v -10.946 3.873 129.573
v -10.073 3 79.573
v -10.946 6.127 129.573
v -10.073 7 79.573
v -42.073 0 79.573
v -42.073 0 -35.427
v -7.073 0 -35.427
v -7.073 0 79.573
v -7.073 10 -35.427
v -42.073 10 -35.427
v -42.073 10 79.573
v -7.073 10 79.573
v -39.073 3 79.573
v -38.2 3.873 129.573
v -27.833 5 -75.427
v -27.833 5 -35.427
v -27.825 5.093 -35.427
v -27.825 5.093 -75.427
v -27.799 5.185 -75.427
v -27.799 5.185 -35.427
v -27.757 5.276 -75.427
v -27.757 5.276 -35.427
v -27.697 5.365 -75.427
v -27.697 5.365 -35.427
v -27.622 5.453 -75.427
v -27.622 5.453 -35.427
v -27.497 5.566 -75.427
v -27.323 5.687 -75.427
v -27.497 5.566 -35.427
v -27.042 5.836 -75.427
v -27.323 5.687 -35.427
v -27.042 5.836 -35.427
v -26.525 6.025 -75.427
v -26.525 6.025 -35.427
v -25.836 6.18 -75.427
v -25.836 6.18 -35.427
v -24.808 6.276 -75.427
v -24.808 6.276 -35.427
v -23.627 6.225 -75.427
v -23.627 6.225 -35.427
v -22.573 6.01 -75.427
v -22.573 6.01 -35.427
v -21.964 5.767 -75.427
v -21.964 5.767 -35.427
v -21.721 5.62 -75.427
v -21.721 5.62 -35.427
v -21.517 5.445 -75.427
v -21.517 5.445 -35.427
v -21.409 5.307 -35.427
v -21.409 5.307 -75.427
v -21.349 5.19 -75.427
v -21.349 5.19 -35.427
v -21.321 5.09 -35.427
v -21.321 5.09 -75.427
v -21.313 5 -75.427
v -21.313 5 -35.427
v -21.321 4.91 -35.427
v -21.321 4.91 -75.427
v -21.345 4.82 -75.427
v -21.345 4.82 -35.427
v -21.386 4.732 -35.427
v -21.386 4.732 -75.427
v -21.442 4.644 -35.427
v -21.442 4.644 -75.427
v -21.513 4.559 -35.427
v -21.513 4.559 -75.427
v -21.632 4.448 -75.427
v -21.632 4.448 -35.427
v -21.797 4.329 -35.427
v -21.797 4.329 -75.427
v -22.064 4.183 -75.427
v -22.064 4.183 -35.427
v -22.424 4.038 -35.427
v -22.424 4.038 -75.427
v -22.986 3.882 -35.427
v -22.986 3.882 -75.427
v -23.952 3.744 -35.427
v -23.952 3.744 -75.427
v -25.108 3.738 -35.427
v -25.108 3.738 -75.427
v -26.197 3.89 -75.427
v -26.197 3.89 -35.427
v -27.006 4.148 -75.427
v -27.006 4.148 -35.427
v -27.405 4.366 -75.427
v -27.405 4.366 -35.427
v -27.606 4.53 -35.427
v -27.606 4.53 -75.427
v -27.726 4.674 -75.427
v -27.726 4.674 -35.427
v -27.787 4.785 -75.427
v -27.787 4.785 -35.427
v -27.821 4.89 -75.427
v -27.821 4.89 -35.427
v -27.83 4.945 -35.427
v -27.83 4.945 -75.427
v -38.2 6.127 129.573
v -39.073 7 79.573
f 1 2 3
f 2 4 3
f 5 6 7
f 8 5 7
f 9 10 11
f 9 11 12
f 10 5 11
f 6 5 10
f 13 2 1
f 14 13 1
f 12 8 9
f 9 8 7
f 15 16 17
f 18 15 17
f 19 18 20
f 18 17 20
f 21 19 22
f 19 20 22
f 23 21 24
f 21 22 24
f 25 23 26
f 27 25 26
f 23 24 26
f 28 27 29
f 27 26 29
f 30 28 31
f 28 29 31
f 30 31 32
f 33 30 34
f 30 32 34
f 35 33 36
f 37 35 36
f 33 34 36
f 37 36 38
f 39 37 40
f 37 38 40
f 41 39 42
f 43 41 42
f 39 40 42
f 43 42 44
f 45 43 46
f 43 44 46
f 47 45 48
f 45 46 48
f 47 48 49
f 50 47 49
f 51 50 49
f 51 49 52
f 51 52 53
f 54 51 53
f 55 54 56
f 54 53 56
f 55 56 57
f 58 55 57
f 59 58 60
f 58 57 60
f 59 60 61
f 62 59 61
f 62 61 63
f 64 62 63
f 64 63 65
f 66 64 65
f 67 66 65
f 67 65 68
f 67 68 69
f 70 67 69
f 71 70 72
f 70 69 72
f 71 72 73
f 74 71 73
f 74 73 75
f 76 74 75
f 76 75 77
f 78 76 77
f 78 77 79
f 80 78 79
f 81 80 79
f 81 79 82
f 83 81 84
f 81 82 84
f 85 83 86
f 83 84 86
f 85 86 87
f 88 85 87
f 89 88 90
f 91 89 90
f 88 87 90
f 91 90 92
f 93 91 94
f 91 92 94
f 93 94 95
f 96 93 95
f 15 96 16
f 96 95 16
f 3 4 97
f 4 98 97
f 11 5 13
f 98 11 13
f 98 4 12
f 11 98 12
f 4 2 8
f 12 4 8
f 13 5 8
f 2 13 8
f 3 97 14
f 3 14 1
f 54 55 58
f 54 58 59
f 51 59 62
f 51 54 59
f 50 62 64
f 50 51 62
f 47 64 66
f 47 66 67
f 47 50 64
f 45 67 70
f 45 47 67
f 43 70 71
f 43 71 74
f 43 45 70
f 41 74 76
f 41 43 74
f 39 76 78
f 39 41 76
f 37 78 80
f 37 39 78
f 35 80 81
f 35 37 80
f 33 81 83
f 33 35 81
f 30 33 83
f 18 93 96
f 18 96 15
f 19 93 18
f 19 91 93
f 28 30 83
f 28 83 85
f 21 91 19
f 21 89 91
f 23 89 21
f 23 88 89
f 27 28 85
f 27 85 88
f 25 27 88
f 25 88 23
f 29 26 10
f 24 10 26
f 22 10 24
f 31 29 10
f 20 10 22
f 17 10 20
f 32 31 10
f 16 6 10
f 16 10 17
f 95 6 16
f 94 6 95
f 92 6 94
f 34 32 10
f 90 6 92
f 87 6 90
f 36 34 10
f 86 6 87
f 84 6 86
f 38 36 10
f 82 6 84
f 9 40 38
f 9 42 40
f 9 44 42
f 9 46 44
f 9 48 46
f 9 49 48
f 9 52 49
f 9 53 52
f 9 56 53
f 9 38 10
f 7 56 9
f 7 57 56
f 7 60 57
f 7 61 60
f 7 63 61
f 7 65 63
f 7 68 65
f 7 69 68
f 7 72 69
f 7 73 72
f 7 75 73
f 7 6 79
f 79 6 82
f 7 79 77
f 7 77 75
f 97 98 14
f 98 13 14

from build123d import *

# Parameters (mm, degrees)
SKETCH1_W           = 35
SKETCH1_H           = 115
BOSS_EXTRUDE1_DEPTH = 10
SKETCH2_W           = 29
SKETCH2_H           = 4
BOSS_EXTRUDE2_DEPTH = 50
BOSS_EXTRUDE2_TAPER = 1
SKETCH3_RX          = 3.259941838
SKETCH3_RY          = 1.279729234
BOSS_EXTRUDE3_DEPTH = 40


with BuildPart() as part:
    # Sketch1 → Boss-Extrude1 (new body)
    with BuildSketch(Plane(origin=(0, 0, 0), x_dir=(1, 0, 0), z_dir=(0, 1, 0))):
        with Locations((-24.573170732, -22.073170732)):
            Rectangle(SKETCH1_W, SKETCH1_H)
    extrude(amount=BOSS_EXTRUDE1_DEPTH)

    # Sketch2 → Boss-Extrude2 (add)
    with BuildSketch(Plane.XY.offset(79.573170732)):
        with Locations((-24.573170732, 5)):
            Rectangle(SKETCH2_W, SKETCH2_H)
    extrude(amount=BOSS_EXTRUDE2_DEPTH, taper=BOSS_EXTRUDE2_TAPER)

    # Sketch3 → Boss-Extrude3 (add)
    with BuildSketch(Plane(origin=(0, 0, -35.426829268), x_dir=(-1, 0, 0), z_dir=(0, 0, -1))):
        with Locations((24.573170732, 5)):
            Ellipse(SKETCH3_RX, SKETCH3_RY)
    extrude(amount=BOSS_EXTRUDE3_DEPTH)


solid = part.part
